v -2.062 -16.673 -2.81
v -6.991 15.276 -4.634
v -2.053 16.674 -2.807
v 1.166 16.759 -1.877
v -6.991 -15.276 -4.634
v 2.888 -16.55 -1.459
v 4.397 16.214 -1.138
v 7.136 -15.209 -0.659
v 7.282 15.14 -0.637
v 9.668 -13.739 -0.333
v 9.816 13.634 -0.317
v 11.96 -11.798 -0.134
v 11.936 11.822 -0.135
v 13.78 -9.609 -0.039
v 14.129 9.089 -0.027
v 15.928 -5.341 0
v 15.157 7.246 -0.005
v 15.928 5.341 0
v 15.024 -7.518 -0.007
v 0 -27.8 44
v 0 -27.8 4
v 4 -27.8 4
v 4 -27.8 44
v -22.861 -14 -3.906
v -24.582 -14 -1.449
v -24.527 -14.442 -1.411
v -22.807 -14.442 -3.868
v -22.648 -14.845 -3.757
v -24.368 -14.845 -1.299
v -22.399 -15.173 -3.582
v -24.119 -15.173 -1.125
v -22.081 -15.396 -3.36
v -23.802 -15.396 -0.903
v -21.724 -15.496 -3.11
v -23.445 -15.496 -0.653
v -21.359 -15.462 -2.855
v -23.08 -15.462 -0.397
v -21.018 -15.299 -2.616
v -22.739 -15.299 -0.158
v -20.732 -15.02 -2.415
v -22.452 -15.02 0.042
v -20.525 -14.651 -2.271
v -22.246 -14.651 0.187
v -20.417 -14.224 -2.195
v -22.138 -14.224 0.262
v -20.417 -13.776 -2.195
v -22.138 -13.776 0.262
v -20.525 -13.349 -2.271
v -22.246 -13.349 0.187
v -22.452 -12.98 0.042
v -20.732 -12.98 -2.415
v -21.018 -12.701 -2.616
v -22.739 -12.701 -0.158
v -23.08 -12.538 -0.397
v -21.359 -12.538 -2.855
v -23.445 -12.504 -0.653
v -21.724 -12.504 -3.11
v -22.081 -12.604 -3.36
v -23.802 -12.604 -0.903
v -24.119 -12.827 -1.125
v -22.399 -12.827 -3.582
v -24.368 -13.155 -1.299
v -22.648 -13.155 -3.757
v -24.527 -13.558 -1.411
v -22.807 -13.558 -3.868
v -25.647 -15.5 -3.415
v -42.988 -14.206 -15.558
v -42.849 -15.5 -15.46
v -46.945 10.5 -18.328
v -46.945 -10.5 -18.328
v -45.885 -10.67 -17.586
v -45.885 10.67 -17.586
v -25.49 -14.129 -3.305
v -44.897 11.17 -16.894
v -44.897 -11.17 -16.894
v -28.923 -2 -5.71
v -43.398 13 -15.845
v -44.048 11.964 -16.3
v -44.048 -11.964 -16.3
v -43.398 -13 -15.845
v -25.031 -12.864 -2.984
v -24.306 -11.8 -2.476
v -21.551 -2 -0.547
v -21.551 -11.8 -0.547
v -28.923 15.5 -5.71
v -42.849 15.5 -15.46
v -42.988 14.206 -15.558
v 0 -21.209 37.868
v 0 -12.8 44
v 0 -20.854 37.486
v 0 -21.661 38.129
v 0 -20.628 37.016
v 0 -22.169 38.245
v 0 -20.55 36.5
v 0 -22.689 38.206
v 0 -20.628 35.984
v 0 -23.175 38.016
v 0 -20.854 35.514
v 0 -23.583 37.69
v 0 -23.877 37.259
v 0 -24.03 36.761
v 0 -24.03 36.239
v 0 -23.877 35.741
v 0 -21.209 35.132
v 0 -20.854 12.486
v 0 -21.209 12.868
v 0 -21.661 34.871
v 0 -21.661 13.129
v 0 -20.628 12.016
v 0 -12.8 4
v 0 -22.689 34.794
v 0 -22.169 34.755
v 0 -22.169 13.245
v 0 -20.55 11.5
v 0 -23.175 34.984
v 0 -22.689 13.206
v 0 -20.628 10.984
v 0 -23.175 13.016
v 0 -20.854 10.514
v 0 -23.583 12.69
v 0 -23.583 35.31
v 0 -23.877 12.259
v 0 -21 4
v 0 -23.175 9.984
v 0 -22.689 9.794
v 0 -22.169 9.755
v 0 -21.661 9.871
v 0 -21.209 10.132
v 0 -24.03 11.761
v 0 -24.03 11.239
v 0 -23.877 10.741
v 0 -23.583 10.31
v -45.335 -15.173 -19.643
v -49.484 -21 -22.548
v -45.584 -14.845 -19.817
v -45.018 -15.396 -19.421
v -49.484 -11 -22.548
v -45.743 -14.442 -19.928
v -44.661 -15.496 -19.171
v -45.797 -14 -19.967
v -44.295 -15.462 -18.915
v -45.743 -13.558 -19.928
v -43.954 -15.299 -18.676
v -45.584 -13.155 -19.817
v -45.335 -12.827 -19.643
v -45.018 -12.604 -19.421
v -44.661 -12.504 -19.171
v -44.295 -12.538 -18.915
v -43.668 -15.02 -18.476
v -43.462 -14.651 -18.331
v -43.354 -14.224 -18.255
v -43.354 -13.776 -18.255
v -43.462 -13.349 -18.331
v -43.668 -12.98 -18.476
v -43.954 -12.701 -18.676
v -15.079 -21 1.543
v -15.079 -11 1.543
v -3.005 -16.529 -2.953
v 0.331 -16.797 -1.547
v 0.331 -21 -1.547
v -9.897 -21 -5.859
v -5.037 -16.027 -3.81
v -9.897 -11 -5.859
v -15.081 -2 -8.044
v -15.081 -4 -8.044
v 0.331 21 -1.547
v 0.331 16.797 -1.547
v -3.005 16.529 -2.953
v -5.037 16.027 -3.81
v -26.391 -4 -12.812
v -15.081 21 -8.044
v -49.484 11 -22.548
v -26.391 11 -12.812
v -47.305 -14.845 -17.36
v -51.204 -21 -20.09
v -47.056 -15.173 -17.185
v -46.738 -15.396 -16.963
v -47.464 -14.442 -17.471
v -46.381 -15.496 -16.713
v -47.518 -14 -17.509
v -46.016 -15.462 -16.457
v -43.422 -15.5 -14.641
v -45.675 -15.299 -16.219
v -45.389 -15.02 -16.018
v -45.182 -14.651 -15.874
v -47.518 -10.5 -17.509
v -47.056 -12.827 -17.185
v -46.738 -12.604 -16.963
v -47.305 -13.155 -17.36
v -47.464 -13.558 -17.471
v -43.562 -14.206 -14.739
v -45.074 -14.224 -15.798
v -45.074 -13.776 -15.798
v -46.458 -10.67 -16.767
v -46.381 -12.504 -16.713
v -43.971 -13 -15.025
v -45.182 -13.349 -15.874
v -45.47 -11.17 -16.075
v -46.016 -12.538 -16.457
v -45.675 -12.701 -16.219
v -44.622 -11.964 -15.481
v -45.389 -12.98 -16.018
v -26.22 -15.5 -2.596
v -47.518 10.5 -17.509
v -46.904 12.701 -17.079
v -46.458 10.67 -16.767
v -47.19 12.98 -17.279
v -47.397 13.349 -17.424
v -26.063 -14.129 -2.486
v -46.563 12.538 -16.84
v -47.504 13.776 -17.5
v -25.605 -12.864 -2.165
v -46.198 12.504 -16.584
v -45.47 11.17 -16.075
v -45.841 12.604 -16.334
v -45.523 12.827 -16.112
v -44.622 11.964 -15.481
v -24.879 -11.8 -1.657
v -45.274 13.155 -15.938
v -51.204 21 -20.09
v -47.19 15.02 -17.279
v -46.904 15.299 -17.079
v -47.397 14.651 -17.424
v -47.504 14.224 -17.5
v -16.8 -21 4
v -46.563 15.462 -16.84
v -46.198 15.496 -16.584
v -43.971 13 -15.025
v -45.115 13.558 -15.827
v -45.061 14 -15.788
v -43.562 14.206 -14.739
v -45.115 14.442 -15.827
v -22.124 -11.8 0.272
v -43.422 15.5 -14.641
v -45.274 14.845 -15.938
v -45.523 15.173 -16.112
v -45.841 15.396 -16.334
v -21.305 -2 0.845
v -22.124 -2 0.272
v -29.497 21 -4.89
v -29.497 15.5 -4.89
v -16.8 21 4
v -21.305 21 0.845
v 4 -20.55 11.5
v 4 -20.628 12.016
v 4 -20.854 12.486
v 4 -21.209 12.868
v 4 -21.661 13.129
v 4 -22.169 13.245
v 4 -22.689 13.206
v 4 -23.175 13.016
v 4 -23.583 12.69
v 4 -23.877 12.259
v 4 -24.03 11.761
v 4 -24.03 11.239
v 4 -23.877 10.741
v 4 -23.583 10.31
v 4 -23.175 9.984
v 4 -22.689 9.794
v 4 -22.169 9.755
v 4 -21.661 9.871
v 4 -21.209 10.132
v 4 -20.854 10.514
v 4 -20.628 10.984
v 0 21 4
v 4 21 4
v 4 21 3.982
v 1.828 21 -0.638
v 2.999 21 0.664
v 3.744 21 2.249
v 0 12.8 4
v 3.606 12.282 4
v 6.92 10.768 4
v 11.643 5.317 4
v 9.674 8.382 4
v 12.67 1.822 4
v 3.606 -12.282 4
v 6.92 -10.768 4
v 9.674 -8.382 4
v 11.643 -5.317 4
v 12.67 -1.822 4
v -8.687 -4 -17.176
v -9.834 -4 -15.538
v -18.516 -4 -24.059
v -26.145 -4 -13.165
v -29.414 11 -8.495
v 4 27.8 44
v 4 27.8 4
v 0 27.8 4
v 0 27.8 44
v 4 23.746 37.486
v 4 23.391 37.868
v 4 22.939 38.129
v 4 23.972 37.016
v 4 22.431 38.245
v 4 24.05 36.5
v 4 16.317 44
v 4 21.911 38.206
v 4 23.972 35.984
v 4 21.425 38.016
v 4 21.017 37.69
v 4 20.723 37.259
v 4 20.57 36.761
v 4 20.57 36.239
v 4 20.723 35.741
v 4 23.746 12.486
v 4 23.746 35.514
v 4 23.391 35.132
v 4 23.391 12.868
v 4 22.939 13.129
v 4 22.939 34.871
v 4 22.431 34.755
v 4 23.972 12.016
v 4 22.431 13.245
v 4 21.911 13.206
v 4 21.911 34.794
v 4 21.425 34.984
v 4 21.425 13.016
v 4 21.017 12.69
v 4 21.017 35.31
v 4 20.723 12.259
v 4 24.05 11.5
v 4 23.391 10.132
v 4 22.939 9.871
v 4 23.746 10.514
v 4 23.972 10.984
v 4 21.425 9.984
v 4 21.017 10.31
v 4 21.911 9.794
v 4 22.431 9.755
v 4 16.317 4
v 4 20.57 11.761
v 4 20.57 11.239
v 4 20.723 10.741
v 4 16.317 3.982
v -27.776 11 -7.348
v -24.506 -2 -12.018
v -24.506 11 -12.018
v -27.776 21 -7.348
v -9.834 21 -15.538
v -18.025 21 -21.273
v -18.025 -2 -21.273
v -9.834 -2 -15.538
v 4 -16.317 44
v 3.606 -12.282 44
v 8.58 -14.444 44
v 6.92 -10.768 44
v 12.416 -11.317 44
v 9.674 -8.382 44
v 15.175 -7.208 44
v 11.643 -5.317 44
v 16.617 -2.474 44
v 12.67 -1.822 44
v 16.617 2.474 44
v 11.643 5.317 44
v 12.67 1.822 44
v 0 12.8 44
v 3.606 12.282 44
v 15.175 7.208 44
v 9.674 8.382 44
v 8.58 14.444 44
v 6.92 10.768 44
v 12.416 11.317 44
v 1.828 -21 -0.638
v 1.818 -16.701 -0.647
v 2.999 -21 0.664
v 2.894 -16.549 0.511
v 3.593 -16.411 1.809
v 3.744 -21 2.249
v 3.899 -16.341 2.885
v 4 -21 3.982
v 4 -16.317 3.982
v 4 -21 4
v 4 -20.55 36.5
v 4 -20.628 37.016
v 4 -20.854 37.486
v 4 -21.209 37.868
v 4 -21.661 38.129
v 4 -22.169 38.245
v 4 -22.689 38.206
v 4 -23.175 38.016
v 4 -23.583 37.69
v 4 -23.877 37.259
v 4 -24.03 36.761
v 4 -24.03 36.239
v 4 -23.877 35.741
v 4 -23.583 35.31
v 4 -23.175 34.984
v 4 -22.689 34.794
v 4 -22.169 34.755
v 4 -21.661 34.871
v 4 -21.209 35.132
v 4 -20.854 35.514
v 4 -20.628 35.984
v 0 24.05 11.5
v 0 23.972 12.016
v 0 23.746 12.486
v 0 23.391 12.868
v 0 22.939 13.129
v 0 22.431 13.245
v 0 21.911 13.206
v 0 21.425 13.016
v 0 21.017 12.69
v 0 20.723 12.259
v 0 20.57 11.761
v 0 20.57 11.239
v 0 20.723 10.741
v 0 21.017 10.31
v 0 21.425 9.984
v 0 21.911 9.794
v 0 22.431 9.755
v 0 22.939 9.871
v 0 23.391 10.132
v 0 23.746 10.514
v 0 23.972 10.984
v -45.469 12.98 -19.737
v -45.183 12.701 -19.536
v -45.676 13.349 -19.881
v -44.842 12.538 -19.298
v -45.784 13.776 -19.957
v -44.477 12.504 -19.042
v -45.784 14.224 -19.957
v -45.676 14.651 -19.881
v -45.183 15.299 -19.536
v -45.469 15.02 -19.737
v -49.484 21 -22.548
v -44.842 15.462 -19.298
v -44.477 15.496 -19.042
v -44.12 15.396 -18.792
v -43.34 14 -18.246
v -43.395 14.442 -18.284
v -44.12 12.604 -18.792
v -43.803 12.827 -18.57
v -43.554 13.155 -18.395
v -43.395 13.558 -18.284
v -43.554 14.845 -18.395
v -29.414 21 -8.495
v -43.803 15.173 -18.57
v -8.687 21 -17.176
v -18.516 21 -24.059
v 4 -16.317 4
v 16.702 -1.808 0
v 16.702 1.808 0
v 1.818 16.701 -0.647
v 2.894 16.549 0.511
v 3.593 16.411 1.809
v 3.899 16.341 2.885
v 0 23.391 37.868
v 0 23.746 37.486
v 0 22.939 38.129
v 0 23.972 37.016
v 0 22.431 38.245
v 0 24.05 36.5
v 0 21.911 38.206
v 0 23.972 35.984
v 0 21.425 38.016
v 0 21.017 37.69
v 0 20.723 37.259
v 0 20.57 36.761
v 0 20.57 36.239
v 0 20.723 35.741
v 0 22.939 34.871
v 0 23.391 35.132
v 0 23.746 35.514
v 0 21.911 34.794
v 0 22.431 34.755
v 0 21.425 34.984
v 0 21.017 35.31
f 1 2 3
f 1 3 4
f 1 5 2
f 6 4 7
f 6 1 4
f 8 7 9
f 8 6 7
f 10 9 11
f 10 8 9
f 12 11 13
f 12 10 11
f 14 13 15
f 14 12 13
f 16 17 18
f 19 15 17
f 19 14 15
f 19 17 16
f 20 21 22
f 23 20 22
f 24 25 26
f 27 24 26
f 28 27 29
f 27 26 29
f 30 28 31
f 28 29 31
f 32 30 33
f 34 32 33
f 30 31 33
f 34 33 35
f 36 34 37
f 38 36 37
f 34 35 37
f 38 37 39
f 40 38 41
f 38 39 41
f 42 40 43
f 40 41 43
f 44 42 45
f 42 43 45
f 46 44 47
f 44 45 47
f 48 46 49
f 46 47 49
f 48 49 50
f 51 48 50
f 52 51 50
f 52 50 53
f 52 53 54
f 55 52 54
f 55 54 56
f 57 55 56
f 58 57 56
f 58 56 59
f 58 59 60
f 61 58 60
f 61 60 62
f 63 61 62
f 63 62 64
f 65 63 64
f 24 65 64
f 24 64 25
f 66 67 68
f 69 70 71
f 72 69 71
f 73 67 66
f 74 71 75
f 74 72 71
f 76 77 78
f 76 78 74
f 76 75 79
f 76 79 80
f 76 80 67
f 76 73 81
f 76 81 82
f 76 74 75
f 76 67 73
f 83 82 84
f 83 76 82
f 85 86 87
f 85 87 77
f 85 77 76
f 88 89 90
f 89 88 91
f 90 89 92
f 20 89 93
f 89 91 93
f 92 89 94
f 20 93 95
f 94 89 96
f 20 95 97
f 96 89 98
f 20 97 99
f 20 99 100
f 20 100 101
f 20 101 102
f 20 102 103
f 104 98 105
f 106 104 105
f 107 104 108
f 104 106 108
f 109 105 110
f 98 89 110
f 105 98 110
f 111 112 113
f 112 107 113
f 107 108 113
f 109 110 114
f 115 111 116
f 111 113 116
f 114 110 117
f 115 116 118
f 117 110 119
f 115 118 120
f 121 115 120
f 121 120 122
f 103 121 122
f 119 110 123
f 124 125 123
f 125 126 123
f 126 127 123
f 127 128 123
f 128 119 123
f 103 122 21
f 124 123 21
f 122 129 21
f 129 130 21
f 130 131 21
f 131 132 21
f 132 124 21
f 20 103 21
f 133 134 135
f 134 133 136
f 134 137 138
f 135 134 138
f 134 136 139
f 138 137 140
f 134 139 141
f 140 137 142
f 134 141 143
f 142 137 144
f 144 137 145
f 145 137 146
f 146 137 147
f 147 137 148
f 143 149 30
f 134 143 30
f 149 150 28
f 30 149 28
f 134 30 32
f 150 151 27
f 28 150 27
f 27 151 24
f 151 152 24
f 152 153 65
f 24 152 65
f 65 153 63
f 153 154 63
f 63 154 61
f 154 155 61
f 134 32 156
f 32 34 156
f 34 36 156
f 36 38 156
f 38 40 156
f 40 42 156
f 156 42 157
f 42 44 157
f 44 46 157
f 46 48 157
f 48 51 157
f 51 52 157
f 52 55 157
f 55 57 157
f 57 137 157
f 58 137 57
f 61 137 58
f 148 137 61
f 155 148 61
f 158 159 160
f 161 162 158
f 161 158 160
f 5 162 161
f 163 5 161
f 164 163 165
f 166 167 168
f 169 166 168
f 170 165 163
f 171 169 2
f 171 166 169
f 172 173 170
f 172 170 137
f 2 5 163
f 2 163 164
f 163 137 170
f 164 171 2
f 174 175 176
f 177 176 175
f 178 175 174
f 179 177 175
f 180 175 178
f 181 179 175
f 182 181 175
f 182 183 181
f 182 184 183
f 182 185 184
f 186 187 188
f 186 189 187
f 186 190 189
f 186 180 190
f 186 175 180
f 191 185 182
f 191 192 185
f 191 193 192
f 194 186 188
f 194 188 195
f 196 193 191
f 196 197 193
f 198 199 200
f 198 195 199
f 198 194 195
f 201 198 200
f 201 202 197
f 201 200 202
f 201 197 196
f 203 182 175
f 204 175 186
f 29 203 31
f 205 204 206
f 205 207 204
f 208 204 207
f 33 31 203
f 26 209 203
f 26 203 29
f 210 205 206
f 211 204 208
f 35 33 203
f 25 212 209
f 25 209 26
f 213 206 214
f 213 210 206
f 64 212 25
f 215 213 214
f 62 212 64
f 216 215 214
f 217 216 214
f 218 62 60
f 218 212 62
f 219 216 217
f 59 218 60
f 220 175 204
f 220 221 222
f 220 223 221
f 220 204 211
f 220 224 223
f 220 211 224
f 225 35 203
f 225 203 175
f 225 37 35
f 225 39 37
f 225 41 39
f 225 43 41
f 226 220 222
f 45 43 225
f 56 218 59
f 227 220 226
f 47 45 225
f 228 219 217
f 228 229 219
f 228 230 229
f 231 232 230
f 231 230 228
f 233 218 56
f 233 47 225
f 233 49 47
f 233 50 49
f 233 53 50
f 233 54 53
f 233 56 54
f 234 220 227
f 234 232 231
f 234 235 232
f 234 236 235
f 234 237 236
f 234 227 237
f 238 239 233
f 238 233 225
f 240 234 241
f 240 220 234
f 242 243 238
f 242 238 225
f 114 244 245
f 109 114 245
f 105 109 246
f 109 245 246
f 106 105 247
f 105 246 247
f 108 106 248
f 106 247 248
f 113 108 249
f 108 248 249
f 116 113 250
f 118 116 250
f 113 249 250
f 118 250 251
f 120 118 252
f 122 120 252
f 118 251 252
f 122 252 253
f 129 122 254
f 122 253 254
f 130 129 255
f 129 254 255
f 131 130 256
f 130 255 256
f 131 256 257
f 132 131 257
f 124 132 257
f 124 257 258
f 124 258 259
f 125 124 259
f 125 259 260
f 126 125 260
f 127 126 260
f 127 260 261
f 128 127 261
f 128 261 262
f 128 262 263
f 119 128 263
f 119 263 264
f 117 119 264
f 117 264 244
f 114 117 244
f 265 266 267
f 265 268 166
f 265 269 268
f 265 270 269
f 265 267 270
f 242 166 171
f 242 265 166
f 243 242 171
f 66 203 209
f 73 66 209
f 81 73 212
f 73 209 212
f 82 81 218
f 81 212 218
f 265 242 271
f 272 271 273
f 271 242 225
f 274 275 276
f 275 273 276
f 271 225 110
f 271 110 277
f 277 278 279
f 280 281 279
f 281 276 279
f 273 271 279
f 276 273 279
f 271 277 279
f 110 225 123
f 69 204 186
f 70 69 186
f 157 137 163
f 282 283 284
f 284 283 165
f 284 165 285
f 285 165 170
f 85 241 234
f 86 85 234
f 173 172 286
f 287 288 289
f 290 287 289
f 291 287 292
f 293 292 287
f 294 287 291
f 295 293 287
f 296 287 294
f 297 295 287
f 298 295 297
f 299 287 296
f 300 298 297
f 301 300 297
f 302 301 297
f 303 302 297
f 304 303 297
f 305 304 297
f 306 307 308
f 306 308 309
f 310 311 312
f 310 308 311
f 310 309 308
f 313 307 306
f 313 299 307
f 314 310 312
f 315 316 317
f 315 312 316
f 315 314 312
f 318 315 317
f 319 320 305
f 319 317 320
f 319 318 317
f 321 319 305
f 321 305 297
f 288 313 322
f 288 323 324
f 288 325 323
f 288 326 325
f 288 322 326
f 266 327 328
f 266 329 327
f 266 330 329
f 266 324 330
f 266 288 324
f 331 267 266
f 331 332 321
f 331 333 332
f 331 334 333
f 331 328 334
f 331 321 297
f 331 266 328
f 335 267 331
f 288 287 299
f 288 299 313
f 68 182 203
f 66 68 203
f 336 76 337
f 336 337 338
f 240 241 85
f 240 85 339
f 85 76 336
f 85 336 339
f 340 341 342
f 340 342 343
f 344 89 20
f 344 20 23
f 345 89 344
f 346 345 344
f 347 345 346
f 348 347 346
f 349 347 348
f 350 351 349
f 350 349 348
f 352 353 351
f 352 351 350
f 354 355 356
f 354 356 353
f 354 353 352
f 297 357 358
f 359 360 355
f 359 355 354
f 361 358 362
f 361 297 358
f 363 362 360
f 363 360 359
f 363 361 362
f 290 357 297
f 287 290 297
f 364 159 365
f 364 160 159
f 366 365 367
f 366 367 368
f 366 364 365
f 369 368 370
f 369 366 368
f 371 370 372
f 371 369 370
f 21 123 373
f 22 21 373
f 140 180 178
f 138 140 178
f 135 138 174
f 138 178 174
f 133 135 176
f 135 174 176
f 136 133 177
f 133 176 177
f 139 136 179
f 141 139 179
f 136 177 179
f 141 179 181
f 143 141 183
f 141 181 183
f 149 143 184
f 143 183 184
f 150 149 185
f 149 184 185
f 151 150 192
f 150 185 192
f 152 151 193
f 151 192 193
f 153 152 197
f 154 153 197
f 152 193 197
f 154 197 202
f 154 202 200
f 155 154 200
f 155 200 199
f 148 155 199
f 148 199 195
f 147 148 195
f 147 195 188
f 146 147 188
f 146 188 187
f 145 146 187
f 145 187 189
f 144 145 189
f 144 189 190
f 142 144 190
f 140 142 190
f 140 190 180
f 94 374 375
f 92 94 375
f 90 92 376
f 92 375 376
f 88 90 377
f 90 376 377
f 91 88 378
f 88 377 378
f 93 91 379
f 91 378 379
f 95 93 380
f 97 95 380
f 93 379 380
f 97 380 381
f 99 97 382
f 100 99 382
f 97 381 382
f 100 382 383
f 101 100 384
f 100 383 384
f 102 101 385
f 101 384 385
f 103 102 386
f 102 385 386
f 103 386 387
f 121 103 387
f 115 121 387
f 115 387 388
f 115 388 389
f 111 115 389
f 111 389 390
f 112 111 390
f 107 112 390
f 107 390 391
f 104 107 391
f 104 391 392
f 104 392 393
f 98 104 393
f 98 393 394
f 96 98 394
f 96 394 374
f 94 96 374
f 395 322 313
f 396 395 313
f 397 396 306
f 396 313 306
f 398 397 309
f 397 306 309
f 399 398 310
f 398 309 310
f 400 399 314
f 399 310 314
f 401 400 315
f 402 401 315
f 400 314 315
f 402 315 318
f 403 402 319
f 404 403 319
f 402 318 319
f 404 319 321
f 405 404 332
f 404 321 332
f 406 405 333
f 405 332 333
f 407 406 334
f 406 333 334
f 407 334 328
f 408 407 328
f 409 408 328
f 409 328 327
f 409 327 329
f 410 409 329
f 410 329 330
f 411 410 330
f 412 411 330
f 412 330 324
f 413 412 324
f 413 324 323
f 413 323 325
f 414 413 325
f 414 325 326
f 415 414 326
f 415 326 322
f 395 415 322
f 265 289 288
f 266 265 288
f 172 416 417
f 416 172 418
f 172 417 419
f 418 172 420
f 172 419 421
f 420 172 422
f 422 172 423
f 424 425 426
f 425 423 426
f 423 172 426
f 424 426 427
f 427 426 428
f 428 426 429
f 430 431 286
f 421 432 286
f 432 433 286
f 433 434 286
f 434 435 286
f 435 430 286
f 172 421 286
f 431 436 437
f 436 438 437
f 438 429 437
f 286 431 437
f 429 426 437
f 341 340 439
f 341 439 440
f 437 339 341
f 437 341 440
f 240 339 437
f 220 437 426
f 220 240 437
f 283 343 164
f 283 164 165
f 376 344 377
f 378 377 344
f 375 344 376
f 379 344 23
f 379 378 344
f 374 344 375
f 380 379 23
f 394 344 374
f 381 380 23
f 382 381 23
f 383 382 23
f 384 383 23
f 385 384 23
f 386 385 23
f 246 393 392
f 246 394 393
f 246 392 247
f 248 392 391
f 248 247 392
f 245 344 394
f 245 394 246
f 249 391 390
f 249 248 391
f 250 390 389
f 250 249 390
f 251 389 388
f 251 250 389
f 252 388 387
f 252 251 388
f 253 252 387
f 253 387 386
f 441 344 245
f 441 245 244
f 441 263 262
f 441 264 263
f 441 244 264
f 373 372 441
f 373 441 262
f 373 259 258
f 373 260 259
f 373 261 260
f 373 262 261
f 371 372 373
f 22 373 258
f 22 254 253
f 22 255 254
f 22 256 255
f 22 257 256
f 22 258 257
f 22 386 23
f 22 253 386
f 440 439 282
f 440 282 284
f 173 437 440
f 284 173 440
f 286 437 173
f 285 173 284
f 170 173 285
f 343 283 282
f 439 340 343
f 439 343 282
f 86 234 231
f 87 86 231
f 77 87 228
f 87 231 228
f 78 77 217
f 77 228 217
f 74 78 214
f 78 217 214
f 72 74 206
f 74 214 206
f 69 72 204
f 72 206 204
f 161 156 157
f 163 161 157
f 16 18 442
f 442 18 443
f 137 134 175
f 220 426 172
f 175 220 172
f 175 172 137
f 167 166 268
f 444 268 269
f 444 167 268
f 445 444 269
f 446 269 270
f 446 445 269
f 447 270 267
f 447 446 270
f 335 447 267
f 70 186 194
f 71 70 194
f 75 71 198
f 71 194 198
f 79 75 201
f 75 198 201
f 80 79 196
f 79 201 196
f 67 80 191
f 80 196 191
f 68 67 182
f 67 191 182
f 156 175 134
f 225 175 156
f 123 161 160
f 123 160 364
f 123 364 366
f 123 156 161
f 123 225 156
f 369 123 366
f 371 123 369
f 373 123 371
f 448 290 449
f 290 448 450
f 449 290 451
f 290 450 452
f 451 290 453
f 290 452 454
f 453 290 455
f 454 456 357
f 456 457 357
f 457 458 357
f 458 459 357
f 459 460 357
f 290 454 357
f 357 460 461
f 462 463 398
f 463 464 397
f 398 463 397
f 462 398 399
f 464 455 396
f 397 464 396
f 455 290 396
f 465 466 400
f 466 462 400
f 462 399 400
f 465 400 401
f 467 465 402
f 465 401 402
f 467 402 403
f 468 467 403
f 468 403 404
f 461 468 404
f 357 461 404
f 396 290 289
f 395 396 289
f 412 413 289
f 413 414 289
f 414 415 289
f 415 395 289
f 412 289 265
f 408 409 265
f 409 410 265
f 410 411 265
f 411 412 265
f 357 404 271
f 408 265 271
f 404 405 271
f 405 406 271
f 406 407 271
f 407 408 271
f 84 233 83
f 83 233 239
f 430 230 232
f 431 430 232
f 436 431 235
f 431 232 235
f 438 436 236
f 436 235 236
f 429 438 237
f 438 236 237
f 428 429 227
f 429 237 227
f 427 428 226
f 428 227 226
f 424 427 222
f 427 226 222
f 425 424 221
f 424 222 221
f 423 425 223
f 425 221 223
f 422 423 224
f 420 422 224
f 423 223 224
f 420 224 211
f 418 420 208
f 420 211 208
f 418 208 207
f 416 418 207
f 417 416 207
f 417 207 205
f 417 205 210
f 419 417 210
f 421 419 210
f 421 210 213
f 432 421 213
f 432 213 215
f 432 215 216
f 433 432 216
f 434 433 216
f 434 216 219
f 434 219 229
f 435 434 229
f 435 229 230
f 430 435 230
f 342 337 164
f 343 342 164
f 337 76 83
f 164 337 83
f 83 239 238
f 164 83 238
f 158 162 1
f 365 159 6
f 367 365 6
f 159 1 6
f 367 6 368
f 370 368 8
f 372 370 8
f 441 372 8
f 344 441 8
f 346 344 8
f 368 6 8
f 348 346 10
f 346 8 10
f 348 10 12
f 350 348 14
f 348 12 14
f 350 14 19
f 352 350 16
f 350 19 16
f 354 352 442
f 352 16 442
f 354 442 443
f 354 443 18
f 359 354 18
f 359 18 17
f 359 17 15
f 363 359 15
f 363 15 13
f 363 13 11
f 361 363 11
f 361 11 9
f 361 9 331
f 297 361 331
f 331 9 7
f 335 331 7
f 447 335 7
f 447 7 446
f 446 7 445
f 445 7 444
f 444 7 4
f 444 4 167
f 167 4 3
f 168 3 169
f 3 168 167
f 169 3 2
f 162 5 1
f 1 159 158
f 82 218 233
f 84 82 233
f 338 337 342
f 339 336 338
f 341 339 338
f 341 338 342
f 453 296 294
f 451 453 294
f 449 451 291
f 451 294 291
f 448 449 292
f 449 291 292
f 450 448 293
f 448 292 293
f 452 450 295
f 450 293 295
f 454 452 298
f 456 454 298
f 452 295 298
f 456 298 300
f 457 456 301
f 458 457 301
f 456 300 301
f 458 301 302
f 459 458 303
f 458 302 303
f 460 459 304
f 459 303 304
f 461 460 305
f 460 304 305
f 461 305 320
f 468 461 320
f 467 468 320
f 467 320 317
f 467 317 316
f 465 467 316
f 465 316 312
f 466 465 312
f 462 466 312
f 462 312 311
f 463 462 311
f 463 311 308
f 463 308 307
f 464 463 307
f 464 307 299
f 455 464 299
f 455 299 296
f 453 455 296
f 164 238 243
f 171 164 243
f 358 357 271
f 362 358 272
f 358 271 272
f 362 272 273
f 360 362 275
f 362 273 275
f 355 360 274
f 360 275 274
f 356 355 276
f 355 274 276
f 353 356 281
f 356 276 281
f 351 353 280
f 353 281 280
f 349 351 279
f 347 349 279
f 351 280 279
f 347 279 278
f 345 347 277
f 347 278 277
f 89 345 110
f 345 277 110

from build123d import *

# Parameters (mm, degrees)
SKETCH1_R           = 16.8
BOSS_EXTRUDE1_DEPTH = 4
BOSS_EXTRUDE2_DEPTH = 40
BOSS_EXTRUDE3_START = 4
BOSS_EXTRUDE3_DEPTH = 40
CUT_EXTRUDE1_REACH  = 58.049
SKETCH4_R           = 1.75
SKETCH6_W           = 20.8
SKETCH6_H           = 42
BOSS_EXTRUDE5_DEPTH = 4
BOSS_EXTRUDE7_REACH = 69.821
SKETCH14_R          = 1.5
CUT_EXTRUDE7_DEPTH  = 62.710359375
CUT_EXTRUDE8_START  = -3
SKETCH15_W          = 27
SKETCH15_H          = 10
SKETCH15_W_2        = 42
CUT_EXTRUDE8_DEPTH  = 59.710359375
SKETCH16_W          = 10
SKETCH16_H          = 23
CUT_EXTRUDE9_DEPTH  = 62.710359375
CUT_EXTRUDE10_DEPTH = 1
FILLET2_R           = 59
FILLET4_R           = 6
BOSS_EXTRUDE8_DEPTH = 25
BOSS_EXTRUDE9_START = -13.299219
SKETCH19_W          = 12
SKETCH19_H          = 2
BOSS_EXTRUDE9_DEPTH = 11.299219


# Read off the part's stored shape, not the designer's step: Boss-Extrude3
with BuildPart() as part:
    # Sketch1 → Boss-Extrude1 (new body)
    with BuildSketch(Plane(origin=(0, 0, 0), x_dir=(0, 1, 0), z_dir=(0, 0, 1))):
        with Locations(Location((0, 0, 0), (0, 0, 270))):
            Circle(SKETCH1_R)
    extrude(amount=BOSS_EXTRUDE1_DEPTH)

    # Sketch2 → Boss-Extrude2 (add)
    with BuildSketch(Plane.XY.offset(4)):
        with BuildLine():
            Line((0, 16.8), (0, 12.8))
            ThreePointArc((0, 12.8), (12.8, 0), (0, -12.8))
            Line((0, -12.8), (0, -16.8))
            ThreePointArc((0, -16.8), (16.8, 0), (0, 16.8))
        make_face()
    extrude(amount=BOSS_EXTRUDE2_DEPTH)

    # Boss-Extrude3 outline → Boss-Extrude3 (add)
    with BuildSketch(Plane.XY.offset(BOSS_EXTRUDE3_START)):
        with BuildLine():
            Line((0, 27.8), (0, 16.8))
            ThreePointArc((0, 16.8), (2.014536045, 16.678778268), (4, 16.316862443))
            Line((4, 16.316862443), (4, 27.8))
            Line((4, 27.8), (0, 27.8))
        make_face()
        with BuildLine():
            ThreePointArc((4, -16.316862443), (2.014536045, -16.678778268), (0, -16.8))
            Line((0, -16.8), (0, -27.8))
            Line((0, -27.8), (4, -27.8))
            Line((4, -27.8), (4, -16.316862443))
        make_face()
    extrude(amount=BOSS_EXTRUDE3_DEPTH)

    # Sketch4 → Cut-Extrude1 (cut, up to next)
    with BuildSketch(Plane.YZ.offset(4), mode=Mode.PRIVATE) as cut_extrude1_sk1:
        with Locations((22.3, 36.5)):
            Circle(SKETCH4_R)
    cut_extrude1_tool1 = extrude(cut_extrude1_sk1.sketch, amount=-CUT_EXTRUDE1_REACH, mode=Mode.PRIVATE) & part.part
    # Sketch4 → Cut-Extrude1 (cut, up to next)
    with BuildSketch(Plane.YZ.offset(4), mode=Mode.PRIVATE) as cut_extrude1_sk2:
        with Locations((22.3, 11.5)):
            Circle(SKETCH4_R)
    cut_extrude1_tool2 = extrude(cut_extrude1_sk2.sketch, amount=-CUT_EXTRUDE1_REACH, mode=Mode.PRIVATE) & part.part
    # Sketch4 → Cut-Extrude1 (cut, up to next)
    with BuildSketch(Plane.YZ.offset(4), mode=Mode.PRIVATE) as cut_extrude1_sk3:
        with Locations((-22.3, 11.5)):
            Circle(SKETCH4_R)
    cut_extrude1_tool3 = extrude(cut_extrude1_sk3.sketch, amount=-CUT_EXTRUDE1_REACH, mode=Mode.PRIVATE) & part.part
    # Sketch4 → Cut-Extrude1 (cut, up to next)
    with BuildSketch(Plane.YZ.offset(4), mode=Mode.PRIVATE) as cut_extrude1_sk4:
        with Locations((-22.3, 36.5)):
            Circle(SKETCH4_R)
    cut_extrude1_tool4 = extrude(cut_extrude1_sk4.sketch, amount=-CUT_EXTRUDE1_REACH, mode=Mode.PRIVATE) & part.part
    add(cut_extrude1_tool1.solids().sort_by_distance((4, 22.3, 36.5))[0], mode=Mode.SUBTRACT)
    add(cut_extrude1_tool2.solids().sort_by_distance((4, 22.3, 11.5))[0], mode=Mode.SUBTRACT)
    add(cut_extrude1_tool3.solids().sort_by_distance((4, -22.3, 11.5))[0], mode=Mode.SUBTRACT)
    add(cut_extrude1_tool4.solids().sort_by_distance((4, -22.3, 36.5))[0], mode=Mode.SUBTRACT)

    # Sketch6 → Boss-Extrude5 (add)
    with BuildSketch(Plane(origin=(0, 0, 0), x_dir=(1, 0, 0), z_dir=(0, 0, -1))):
        with Locations((-6.4, 0)):
            Rectangle(SKETCH6_W, SKETCH6_H)
    extrude(amount=-BOSS_EXTRUDE5_DEPTH)

    # Boss-Extrude7: up to this face of the body (flat: up to its plane)
    boss_extrude7_end = Plane(part.part.faces().sort_by_distance((-6.4, -21, 2))[0])
    # Sketch10 → Boss-Extrude7 (add, up to the picked face)
    with BuildSketch(Plane(origin=(0, 21, 0), x_dir=(-1, 0, 0), z_dir=(0, 1, 0)), mode=Mode.PRIVATE) as boss_extrude7_sk1:
        Polygon((-4, 0), (49.483656551, -22.54766646), (51.20438586, -20.090210327), (16.8, 4), (-4, 4), align=None)
    boss_extrude7_tool1 = split(extrude(boss_extrude7_sk1.sketch, amount=-BOSS_EXTRUDE7_REACH, mode=Mode.PRIVATE), bisect_by=boss_extrude7_end, keep=Keep.BOTH, mode=Mode.PRIVATE)
    add(boss_extrude7_tool1.solids().sort_by(Axis((-21.697526, 21, -6.303092), (0, -1, 0)))[0])

    # Sketch14 → Cut-Extrude7 (cut, through all)
    with BuildSketch(Plane(origin=(-7.406416038, 0, 10.577458301), x_dir=(0.8191520442889908, 0, 0.5735764363510476), z_dir=(-0.5735764363510476, 0, 0.8191520442889909))):
        with Locations((-47.467448599, 14)):
            Circle(SKETCH14_R)
        with Locations((-19.467448599, 14)):
            Circle(SKETCH14_R)
        with Locations(Location((-19.467448599, -14, 0), (0, 0, 180))):
            Circle(SKETCH14_R)
        with Locations(Location((-47.467448599, -14, 0), (0, 0, 180))):
            Circle(SKETCH14_R)
    extrude(amount=-CUT_EXTRUDE7_DEPTH, mode=Mode.SUBTRACT)

    # Sketch15 → Cut-Extrude8 (cut, through all)
    with BuildSketch(Plane(origin=(-7.406416038, 0, 10.577458301), x_dir=(0.8191520442889908, 0, 0.5735764363510476), z_dir=(-0.5735764363510476, 0, 0.8191520442889909)).offset(CUT_EXTRUDE8_START)):
        with Locations((-39.967448599, 16)):
            Rectangle(SKETCH15_W, SKETCH15_H)
        with Locations((-32.467448599, -16)):
            Rectangle(SKETCH15_W_2, SKETCH15_H)
    extrude(amount=-CUT_EXTRUDE8_DEPTH, mode=Mode.SUBTRACT)

    # Sketch16 → Cut-Extrude9 (cut, through all)
    with BuildSketch(Plane(origin=(-7.406416038, 0, 10.577458301), x_dir=(0.8191520442889908, 0, 0.5735764363510476), z_dir=(-0.5735764363510476, 0, 0.8191520442889909))):
        with Locations((-21.967448599, 9.5)):
            Rectangle(SKETCH16_W, SKETCH16_H)
    extrude(amount=-CUT_EXTRUDE9_DEPTH, mode=Mode.SUBTRACT)

    # Sketch17 → Cut-Extrude10 (cut)
    with BuildSketch(Plane(origin=(-7.406416038, 0, 10.577458301), x_dir=(0.8191520442889908, 0, 0.5735764363510476), z_dir=(-0.5735764363510476, 0, 0.8191520442889909))):
        with BuildLine():
            Line((-48.967448599, 10.5), (-48.967448599, -10.5))
            ThreePointArc((-48.967448599, -10.5), (-45.431914693, -11.964466094), (-43.967448599, -15.5))
            Line((-43.967448599, -15.5), (-22.967448599, -15.5))
            ThreePointArc((-22.967448599, -15.5), (-22.539929967, -13.477028389), (-21.330482943, -11.8))
            Line((-21.330482943, -11.8), (-17.967448599, -11.8))
            Line((-17.967448599, -11.8), (-17.967448599, 15.5))
            Line((-17.967448599, 15.5), (-43.967448599, 15.5))
            ThreePointArc((-43.967448599, 15.5), (-45.431914693, 11.964466094), (-48.967448599, 10.5))
        make_face()
    extrude(amount=-CUT_EXTRUDE10_DEPTH, mode=Mode.SUBTRACT)

    # Fillet2
    fillet2_edges = [part.edges().sort_by_distance(p)[0] for p in [
        (4, 0, 0),
    ]]
    fillet(fillet2_edges, radius=FILLET2_R)

    # Fillet4
    fillet4_edges = [part.edges().sort_by_distance(p)[0] for p in [
        (4, 18.658431222, 0),
        (4, -18.658431222, 0),
    ]]
    fillet(fillet4_edges, radius=FILLET4_R)

    # Sketch18 → Boss-Extrude8 (add)
    with BuildSketch(Plane(origin=(0, 21, 0), x_dir=(-1, 0, 0), z_dir=(0, 1, 0))):
        Polygon((28.92328025, -5.709586808), (18.025327959, -21.273475649), (9.833807517, -15.537711286), (8.686654644, -17.176015374), (18.516479175, -24.058932611), (30.561584339, -6.85673968), align=None)
    extrude(amount=-BOSS_EXTRUDE8_DEPTH)

    # Sketch19 → Boss-Extrude9 (add)
    with BuildSketch(Plane(origin=(5.212265562, 0, -7.443886673), x_dir=(0.819152044288991, 0, 0.5735764363510472), z_dir=(0.5735764363510472, 0, -0.819152044288991)).offset(BOSS_EXTRUDE9_START)):
        with Locations((-22.967448599, 3)):
            Rectangle(SKETCH19_W, SKETCH19_H)
    extrude(amount=BOSS_EXTRUDE9_DEPTH)


solid = part.part
